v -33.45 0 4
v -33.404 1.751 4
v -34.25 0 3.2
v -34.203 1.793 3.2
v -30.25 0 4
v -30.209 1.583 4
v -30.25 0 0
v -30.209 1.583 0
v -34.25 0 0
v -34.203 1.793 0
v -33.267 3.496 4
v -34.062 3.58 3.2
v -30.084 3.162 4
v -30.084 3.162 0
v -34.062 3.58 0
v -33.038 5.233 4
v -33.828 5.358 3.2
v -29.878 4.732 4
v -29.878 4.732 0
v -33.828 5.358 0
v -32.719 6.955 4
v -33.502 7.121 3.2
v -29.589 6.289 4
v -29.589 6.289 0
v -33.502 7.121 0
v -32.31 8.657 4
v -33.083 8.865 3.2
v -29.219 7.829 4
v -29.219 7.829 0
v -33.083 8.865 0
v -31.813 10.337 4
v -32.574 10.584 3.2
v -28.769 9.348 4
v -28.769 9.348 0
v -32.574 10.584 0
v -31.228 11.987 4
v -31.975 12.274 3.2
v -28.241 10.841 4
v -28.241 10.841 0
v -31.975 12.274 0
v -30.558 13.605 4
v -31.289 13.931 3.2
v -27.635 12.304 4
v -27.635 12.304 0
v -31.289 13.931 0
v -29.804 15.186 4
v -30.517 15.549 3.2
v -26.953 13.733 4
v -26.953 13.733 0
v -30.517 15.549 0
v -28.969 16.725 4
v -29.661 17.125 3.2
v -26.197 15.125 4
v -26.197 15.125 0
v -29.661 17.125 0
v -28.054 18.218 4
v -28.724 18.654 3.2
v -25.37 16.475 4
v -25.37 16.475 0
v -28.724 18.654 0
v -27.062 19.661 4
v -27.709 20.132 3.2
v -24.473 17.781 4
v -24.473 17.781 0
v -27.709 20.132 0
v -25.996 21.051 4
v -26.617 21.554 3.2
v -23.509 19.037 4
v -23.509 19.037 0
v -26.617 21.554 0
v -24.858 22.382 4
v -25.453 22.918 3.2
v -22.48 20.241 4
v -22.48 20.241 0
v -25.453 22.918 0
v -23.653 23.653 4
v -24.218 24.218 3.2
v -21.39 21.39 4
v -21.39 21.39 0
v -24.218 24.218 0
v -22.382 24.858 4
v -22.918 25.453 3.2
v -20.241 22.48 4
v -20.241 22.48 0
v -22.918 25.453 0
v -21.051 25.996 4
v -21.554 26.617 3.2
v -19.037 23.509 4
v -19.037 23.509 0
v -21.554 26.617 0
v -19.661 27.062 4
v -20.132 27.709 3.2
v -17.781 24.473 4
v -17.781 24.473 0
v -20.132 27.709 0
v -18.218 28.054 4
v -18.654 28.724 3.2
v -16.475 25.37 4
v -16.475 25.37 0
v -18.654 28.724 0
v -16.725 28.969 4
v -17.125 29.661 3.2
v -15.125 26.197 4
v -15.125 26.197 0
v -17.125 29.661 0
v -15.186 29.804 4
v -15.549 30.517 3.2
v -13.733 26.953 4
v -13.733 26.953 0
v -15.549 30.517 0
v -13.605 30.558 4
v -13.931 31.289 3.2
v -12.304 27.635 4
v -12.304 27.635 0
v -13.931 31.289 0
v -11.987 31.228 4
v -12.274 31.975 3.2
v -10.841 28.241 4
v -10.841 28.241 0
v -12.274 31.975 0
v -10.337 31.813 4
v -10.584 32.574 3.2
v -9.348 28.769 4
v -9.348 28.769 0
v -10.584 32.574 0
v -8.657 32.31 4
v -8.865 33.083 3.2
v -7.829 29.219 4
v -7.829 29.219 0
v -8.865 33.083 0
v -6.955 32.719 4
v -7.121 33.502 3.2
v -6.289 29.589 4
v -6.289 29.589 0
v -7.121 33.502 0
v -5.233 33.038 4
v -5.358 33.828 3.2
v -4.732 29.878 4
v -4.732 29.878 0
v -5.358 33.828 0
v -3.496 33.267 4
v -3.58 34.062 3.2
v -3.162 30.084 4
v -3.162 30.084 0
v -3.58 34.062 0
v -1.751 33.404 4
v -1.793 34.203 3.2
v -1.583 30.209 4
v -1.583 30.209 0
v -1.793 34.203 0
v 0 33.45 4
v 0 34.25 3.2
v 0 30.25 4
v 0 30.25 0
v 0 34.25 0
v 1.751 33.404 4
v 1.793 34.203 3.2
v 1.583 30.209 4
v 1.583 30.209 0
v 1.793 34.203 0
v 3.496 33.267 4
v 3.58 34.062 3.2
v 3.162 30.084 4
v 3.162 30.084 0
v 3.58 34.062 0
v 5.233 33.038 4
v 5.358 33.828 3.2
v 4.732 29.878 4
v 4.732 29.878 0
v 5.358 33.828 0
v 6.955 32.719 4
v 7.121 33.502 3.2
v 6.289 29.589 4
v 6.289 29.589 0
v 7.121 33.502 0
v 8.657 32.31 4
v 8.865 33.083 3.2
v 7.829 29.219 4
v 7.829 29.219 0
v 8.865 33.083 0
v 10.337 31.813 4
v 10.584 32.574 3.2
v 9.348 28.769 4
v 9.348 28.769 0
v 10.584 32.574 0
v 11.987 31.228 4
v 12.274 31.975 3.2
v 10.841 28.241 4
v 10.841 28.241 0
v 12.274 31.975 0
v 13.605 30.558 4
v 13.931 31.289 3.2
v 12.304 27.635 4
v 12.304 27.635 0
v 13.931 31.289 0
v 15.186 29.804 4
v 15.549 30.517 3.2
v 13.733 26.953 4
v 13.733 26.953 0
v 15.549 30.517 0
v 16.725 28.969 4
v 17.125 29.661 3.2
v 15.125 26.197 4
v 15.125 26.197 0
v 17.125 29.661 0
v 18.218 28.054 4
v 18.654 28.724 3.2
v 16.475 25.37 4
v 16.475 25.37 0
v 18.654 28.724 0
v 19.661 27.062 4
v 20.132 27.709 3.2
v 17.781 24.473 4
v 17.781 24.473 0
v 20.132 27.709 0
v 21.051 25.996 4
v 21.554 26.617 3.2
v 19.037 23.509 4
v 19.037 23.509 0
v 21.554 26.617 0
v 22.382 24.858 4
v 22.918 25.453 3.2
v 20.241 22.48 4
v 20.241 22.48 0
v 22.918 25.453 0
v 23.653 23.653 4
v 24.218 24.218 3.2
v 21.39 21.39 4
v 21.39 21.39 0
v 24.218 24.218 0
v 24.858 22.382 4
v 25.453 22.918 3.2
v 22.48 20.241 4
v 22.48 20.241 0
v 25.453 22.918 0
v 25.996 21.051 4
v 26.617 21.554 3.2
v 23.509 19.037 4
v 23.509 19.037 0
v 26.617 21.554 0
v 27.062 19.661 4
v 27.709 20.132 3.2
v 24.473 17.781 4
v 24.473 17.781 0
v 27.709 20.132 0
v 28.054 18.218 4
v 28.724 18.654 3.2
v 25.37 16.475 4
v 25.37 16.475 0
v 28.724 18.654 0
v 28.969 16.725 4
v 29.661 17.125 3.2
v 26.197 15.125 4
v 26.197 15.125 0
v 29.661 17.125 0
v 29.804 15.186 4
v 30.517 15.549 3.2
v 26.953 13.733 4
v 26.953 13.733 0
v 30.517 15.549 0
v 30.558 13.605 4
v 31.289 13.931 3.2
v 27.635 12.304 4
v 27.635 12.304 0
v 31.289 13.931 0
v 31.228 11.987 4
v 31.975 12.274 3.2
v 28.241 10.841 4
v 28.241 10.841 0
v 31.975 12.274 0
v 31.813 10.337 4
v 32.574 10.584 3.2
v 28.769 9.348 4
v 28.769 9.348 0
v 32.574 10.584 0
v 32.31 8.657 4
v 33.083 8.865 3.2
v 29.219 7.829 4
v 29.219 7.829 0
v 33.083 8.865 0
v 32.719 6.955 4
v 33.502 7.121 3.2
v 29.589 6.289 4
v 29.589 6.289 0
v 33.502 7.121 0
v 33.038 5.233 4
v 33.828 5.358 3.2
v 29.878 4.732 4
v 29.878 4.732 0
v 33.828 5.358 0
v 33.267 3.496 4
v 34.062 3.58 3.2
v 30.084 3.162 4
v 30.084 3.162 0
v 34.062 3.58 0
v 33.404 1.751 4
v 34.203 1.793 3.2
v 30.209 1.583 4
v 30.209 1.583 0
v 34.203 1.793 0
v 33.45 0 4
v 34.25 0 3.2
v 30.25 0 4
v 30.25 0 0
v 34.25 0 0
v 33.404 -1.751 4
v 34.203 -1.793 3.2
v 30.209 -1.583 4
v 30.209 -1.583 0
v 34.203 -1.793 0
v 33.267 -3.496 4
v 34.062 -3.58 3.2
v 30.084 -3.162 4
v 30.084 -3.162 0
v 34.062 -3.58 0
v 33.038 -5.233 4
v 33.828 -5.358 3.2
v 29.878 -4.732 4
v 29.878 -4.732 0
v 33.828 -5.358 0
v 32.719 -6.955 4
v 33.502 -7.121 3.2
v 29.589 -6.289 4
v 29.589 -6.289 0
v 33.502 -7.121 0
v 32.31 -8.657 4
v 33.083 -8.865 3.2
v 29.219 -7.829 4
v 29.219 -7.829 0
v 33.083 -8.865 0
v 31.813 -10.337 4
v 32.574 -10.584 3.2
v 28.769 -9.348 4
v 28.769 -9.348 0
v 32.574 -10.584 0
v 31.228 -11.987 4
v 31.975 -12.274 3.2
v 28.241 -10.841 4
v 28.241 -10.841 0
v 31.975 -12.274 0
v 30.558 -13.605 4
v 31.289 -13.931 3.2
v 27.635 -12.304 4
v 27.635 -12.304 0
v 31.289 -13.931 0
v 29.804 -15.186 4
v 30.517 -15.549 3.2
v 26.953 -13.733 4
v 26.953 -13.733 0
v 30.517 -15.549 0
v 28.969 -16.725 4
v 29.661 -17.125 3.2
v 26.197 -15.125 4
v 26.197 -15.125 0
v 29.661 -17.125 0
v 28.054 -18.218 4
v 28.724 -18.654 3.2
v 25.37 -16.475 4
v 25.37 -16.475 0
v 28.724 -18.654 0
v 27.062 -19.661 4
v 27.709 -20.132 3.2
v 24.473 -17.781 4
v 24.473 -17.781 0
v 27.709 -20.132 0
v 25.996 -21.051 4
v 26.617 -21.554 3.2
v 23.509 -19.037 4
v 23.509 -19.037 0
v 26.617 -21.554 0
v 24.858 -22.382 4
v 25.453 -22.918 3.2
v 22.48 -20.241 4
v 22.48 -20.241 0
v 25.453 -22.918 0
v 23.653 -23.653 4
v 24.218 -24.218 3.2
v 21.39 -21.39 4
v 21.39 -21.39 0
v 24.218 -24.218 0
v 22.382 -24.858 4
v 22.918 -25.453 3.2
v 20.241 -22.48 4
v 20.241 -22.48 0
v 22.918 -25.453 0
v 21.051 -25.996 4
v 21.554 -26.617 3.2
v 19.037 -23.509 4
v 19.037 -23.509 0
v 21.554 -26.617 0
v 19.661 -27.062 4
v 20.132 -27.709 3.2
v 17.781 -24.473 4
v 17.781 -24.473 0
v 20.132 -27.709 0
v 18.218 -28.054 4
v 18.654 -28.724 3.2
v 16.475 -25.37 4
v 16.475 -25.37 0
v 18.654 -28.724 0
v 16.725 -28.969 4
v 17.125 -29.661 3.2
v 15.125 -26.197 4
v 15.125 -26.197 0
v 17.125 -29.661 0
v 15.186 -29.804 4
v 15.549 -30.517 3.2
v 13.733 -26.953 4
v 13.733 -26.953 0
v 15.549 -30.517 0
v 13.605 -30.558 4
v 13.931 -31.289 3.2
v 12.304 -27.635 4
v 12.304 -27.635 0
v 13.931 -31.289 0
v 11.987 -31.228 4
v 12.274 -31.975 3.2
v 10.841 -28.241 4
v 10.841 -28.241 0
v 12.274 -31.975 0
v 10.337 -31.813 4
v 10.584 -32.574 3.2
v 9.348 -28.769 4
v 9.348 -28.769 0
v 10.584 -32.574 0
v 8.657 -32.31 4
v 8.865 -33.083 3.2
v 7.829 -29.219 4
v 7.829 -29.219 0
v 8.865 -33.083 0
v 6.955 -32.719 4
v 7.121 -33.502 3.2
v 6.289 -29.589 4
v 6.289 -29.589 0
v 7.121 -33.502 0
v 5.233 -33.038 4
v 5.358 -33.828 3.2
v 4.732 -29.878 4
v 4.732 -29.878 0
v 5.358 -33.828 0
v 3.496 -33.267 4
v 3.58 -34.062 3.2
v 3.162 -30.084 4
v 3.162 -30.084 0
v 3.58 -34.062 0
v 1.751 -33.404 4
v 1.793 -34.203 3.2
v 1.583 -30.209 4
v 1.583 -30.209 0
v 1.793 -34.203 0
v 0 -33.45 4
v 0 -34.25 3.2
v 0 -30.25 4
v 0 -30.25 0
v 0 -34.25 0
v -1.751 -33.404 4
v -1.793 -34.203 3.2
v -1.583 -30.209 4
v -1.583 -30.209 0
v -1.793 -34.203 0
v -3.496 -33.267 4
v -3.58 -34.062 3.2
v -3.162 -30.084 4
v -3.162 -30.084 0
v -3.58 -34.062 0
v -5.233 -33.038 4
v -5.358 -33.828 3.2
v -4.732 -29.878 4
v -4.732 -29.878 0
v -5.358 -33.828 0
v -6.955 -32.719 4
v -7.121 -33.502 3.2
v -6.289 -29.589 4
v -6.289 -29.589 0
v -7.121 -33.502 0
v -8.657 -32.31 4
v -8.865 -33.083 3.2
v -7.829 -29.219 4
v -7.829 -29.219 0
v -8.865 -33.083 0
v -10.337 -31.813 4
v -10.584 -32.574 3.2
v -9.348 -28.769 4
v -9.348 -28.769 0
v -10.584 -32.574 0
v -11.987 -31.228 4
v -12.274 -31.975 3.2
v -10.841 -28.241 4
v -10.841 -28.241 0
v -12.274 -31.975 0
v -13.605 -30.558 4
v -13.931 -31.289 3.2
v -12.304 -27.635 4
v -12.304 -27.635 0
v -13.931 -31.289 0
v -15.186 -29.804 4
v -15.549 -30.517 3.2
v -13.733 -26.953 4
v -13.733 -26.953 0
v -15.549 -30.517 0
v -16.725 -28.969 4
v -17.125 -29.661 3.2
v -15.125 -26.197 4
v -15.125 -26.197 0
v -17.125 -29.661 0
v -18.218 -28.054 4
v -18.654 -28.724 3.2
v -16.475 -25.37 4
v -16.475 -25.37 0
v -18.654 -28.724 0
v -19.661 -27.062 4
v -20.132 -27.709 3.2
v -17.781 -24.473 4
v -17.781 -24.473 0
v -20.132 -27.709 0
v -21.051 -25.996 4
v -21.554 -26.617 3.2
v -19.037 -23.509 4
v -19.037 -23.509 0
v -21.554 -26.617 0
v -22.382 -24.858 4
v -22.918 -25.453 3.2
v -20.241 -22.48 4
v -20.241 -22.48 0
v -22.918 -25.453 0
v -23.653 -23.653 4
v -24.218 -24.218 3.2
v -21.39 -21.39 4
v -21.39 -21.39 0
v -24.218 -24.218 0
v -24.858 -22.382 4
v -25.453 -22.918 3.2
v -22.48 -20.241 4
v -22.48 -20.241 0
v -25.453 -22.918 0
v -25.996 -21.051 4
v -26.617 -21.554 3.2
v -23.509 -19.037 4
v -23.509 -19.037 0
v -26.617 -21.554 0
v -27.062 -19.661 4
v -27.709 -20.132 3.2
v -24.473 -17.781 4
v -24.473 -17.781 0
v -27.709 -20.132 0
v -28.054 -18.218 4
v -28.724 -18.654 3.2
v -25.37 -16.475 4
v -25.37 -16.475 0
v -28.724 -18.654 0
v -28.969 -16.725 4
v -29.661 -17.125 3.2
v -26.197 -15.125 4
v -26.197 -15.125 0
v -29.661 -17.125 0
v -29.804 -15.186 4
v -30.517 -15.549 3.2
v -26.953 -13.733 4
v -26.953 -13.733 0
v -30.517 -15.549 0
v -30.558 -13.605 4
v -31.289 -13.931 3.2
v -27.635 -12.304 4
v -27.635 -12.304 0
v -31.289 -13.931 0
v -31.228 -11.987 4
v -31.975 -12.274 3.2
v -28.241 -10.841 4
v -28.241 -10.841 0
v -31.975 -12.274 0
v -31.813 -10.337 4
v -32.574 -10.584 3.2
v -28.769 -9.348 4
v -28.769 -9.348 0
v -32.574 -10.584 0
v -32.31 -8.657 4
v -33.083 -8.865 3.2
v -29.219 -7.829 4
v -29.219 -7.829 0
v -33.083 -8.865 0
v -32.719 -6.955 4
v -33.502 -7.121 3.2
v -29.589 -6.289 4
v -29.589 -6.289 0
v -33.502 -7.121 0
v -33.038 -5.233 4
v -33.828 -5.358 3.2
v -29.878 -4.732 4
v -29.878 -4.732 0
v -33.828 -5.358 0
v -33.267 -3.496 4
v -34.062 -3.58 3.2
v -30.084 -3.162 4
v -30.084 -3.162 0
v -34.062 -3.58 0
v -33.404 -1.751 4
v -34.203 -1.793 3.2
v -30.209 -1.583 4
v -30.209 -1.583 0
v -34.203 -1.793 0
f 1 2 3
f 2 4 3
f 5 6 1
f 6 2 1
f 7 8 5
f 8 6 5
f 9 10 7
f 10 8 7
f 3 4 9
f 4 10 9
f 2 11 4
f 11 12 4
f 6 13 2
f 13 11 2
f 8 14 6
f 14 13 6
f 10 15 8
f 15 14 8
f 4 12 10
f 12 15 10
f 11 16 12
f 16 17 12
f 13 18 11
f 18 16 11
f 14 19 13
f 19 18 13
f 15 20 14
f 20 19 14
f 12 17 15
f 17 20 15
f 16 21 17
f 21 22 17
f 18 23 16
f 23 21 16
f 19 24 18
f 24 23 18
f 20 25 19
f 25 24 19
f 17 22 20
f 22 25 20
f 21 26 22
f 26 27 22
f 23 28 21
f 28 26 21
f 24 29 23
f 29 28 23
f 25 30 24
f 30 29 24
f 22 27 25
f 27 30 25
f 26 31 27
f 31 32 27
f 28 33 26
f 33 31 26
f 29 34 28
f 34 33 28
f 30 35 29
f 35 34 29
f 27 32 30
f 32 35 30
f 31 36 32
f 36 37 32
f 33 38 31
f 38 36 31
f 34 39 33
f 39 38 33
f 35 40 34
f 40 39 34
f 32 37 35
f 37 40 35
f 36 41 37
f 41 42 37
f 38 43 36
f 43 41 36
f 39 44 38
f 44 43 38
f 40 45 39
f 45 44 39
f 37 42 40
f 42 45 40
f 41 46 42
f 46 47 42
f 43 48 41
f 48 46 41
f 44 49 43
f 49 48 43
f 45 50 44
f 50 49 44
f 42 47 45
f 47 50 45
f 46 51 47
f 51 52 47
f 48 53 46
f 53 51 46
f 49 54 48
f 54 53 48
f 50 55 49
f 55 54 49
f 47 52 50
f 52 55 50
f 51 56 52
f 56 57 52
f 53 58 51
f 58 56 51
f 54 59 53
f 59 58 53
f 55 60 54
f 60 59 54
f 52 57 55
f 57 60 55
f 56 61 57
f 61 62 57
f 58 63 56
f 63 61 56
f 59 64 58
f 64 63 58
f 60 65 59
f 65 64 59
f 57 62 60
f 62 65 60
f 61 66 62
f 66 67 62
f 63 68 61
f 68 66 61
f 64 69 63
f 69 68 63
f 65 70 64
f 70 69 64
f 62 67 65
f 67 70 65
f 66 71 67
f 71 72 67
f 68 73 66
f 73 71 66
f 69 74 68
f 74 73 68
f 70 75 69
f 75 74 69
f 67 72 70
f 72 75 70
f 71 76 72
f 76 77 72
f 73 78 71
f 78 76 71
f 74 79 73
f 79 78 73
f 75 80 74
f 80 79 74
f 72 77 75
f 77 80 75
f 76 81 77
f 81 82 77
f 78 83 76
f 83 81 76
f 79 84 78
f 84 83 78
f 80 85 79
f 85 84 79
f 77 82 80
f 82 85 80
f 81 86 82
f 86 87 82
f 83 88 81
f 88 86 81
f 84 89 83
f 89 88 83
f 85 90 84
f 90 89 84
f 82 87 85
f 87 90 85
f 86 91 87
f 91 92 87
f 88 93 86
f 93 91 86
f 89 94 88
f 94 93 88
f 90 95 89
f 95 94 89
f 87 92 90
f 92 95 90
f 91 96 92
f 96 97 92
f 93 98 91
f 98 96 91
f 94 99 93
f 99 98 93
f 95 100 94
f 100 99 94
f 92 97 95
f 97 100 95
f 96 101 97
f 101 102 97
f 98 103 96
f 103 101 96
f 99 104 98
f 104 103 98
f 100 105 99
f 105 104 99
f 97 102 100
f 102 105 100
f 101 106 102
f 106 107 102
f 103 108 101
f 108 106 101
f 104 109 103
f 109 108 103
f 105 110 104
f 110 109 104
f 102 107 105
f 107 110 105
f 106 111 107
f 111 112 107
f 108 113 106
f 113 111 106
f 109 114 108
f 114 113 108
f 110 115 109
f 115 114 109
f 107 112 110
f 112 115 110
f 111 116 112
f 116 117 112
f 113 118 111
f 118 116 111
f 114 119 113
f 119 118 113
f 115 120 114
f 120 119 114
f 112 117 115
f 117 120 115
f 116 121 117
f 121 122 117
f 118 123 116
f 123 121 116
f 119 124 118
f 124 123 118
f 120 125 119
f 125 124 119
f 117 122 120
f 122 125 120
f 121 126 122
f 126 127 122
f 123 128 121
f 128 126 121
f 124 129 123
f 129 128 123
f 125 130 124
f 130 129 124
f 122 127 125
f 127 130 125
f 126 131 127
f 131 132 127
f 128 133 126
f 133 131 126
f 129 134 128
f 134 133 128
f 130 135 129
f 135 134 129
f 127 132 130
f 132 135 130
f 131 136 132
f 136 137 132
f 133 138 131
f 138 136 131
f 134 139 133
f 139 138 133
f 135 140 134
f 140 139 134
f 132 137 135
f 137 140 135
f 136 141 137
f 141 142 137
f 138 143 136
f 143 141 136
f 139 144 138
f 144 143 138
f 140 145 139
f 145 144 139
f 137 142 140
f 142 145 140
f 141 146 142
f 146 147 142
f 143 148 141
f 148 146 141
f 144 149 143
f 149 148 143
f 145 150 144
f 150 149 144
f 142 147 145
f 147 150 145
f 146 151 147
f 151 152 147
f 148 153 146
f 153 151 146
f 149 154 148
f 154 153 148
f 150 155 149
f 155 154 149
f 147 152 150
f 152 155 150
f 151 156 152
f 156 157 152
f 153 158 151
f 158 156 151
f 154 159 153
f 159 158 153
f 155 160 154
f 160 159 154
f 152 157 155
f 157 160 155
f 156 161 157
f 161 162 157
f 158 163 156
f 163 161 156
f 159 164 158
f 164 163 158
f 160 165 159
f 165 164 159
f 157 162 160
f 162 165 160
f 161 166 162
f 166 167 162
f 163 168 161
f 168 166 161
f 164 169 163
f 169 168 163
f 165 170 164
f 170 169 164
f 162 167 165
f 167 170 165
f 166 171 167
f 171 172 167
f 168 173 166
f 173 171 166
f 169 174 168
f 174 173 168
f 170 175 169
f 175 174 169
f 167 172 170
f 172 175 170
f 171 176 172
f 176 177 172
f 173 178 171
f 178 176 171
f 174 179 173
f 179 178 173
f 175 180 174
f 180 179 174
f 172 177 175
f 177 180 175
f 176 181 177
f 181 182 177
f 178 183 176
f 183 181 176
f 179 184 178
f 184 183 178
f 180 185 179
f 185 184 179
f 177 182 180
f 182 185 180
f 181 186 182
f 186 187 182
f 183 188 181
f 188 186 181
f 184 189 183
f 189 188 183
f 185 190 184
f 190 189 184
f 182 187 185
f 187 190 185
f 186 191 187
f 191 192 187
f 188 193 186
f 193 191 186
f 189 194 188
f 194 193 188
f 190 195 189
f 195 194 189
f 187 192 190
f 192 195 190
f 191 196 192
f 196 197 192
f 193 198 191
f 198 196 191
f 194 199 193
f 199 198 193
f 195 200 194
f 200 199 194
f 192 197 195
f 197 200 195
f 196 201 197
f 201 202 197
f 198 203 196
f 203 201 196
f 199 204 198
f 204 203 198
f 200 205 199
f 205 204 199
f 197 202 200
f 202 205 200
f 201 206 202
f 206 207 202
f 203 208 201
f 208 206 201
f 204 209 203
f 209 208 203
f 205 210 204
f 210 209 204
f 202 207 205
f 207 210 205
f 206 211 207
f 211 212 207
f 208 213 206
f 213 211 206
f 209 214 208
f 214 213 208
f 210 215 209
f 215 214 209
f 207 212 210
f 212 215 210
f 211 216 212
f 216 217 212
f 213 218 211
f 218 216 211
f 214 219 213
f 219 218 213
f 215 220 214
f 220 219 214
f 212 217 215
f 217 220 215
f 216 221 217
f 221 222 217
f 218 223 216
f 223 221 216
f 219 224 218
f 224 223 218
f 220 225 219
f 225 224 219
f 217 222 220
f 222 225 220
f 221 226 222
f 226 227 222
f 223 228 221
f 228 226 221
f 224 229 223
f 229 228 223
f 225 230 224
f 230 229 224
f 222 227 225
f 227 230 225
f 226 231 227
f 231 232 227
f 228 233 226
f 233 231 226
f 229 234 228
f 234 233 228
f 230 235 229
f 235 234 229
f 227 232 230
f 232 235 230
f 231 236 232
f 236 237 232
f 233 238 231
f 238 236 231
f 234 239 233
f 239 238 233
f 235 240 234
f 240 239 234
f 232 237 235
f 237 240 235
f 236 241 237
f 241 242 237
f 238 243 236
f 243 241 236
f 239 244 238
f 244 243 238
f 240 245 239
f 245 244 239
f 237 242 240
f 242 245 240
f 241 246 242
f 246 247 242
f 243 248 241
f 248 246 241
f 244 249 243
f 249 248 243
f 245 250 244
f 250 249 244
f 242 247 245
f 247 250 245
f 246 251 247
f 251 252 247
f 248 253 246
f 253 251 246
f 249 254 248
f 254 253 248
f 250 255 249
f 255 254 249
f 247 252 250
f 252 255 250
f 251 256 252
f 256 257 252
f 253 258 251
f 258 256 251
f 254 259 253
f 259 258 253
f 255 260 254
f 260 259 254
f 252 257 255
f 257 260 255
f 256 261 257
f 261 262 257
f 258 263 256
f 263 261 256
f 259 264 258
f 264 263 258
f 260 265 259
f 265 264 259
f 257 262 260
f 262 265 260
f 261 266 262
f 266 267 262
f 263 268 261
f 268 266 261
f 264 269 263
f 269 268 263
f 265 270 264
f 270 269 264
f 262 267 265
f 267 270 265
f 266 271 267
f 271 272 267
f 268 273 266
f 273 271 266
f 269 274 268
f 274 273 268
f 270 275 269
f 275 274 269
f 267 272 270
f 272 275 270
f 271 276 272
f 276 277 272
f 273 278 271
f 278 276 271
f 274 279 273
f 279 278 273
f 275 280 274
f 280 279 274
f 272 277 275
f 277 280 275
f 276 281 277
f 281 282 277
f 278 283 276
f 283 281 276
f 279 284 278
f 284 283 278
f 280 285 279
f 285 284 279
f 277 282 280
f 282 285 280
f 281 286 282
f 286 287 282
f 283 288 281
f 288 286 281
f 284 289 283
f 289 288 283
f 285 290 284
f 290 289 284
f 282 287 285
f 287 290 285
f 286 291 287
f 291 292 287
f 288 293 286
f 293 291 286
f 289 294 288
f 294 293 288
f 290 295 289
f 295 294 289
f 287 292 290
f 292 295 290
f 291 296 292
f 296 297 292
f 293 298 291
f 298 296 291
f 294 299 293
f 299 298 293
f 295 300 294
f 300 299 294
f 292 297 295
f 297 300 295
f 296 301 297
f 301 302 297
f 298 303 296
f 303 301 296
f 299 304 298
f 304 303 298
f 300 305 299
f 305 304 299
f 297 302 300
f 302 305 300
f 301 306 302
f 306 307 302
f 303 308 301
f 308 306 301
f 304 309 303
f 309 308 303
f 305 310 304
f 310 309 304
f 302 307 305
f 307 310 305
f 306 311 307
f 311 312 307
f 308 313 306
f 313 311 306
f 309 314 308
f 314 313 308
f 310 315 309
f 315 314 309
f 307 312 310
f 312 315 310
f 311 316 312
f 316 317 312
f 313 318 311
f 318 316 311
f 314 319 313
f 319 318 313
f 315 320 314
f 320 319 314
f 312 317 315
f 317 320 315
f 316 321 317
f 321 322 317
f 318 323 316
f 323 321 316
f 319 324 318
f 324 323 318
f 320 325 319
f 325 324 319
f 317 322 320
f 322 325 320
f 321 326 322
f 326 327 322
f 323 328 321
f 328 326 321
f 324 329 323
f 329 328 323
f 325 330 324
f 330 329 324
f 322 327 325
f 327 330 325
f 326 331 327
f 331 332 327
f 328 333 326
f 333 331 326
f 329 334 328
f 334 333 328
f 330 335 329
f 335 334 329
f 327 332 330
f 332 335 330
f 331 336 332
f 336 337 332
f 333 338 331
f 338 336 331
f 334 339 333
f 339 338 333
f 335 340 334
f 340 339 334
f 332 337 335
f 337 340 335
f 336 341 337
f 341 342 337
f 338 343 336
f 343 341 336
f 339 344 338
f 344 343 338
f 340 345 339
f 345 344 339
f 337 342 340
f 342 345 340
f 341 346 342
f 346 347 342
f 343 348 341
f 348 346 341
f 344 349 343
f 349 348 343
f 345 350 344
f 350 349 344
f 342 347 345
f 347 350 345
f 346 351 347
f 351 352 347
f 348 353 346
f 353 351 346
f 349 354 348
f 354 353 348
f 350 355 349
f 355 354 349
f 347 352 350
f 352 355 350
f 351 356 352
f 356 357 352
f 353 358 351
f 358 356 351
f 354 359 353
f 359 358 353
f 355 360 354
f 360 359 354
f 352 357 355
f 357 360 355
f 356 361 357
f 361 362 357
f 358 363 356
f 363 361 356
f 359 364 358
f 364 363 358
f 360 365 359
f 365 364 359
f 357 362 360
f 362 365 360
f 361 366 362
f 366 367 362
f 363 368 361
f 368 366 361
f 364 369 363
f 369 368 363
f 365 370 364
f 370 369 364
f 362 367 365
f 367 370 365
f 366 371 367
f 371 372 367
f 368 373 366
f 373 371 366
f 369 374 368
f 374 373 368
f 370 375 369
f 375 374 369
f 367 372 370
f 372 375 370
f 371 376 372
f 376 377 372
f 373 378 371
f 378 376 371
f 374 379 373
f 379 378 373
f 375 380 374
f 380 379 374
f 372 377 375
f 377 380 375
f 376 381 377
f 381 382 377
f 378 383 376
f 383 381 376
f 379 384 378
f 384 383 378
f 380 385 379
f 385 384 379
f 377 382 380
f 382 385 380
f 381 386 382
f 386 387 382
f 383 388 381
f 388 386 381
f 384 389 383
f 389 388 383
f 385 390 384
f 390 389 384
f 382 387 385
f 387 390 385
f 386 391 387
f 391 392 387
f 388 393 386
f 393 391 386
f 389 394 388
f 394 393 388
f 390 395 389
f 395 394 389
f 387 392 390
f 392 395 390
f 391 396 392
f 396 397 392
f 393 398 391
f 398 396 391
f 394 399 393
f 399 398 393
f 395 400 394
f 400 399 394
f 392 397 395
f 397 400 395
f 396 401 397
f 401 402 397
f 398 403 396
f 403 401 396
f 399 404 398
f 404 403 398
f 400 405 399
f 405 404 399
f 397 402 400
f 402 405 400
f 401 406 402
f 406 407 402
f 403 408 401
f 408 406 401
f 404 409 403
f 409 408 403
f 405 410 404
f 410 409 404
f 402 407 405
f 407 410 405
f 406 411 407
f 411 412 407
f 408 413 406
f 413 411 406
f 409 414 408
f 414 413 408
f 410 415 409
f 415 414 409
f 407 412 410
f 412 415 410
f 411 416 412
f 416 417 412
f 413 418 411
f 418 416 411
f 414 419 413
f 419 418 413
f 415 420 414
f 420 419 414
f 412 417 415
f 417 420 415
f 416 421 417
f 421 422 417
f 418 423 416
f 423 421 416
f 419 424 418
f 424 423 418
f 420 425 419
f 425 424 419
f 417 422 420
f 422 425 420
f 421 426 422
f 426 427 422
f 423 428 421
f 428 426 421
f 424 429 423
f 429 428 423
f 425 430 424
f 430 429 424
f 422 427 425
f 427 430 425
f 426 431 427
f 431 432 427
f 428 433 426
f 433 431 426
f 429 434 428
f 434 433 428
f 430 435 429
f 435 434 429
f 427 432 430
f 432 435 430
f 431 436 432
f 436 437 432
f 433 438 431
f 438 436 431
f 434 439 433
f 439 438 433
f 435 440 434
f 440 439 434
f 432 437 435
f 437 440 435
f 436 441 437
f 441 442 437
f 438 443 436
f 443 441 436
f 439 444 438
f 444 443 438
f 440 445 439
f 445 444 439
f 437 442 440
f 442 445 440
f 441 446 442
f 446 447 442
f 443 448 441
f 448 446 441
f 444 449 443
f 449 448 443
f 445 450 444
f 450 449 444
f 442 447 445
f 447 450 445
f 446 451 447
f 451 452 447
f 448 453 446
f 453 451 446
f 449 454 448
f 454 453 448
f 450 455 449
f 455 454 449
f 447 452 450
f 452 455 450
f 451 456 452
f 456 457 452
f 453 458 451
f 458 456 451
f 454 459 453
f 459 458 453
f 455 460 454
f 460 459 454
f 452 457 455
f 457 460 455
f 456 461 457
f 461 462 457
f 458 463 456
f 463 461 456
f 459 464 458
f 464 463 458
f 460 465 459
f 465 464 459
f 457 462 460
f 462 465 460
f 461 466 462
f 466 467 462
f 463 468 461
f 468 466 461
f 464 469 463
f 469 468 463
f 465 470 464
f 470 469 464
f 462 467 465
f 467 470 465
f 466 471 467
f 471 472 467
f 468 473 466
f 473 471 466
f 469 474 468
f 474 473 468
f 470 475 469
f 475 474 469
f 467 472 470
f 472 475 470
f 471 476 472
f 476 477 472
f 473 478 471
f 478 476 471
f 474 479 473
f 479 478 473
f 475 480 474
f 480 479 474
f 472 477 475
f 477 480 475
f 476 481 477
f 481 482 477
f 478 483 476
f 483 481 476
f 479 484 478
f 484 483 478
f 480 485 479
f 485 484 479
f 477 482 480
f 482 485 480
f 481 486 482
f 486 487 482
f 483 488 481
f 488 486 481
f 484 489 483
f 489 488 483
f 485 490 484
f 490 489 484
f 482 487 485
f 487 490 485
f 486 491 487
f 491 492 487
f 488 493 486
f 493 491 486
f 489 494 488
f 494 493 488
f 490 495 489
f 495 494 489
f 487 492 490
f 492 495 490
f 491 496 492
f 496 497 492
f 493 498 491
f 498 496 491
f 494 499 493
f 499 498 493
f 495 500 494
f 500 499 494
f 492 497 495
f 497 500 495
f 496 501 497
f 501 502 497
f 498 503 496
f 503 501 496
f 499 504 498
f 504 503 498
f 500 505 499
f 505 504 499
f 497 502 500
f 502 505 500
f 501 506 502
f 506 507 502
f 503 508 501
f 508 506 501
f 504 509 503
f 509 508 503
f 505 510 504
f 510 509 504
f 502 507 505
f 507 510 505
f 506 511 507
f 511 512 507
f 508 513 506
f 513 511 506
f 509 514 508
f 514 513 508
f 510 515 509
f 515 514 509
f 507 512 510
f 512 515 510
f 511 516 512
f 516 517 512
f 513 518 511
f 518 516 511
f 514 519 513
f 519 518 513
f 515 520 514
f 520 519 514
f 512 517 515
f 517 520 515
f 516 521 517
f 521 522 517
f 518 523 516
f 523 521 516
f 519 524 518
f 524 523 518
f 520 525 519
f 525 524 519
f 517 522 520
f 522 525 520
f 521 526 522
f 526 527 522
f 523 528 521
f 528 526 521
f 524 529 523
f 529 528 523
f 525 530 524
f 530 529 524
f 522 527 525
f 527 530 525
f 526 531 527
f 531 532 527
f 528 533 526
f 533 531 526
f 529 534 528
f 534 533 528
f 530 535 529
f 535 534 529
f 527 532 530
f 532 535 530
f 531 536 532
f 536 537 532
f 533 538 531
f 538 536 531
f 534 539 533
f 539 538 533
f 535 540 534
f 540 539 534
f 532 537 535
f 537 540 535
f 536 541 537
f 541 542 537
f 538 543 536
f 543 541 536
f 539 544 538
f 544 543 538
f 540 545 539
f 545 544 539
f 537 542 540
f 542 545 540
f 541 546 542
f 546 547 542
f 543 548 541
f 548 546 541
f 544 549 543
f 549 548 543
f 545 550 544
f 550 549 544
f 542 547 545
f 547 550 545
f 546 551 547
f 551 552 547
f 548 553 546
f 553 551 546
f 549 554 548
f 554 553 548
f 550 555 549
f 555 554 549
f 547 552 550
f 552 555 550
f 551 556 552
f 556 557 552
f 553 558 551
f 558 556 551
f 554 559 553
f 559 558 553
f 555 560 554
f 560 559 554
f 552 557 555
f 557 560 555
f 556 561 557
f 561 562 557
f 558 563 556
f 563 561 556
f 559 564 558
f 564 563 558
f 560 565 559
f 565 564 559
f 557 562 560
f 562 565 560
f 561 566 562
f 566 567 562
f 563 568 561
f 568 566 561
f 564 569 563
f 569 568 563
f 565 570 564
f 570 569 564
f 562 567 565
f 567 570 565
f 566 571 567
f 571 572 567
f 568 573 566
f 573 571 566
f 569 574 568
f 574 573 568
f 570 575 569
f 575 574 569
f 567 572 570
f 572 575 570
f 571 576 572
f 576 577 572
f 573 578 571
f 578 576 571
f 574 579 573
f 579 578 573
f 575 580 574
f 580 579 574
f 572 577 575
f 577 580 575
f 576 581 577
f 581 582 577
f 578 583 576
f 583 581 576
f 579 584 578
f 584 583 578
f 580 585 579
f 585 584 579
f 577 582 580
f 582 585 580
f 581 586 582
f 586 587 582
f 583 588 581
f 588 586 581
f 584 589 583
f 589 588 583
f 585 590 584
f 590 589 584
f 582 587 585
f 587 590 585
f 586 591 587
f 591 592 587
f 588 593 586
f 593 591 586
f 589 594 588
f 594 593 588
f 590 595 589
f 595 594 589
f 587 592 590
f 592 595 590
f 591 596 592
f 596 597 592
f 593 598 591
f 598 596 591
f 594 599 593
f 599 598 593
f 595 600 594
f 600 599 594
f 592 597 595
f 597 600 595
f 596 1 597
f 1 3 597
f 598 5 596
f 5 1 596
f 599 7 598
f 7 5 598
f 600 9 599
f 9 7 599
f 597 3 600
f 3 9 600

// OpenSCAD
// 小米智能猫眼夜光环
// 内径 60.5mm，环宽 4mm，高 4mm
// 顶面外侧倒角，内侧不倒角，底面不倒角

inner_d = 60.5;        // 内径 (mm)
ring_w  = 4;           // 环宽 (mm)
height  = 4;           // 高度 (mm)
chamfer = 0.8;         // 外侧倒角尺寸 (mm)

inner_r = inner_d / 2; // 内半径
outer_r = inner_r + ring_w; // 外半径

$fn = 120; // 圆滑度

rotate_extrude()
    polygon(points = [
        [inner_r, 0],                // 底部内侧
        [outer_r, 0],                // 底部外侧
        [outer_r, height - chamfer], // 外侧倒角起点
        [outer_r - chamfer, height], // 外侧倒角终点
        [inner_r, height],           // 顶部内侧
    ]);
